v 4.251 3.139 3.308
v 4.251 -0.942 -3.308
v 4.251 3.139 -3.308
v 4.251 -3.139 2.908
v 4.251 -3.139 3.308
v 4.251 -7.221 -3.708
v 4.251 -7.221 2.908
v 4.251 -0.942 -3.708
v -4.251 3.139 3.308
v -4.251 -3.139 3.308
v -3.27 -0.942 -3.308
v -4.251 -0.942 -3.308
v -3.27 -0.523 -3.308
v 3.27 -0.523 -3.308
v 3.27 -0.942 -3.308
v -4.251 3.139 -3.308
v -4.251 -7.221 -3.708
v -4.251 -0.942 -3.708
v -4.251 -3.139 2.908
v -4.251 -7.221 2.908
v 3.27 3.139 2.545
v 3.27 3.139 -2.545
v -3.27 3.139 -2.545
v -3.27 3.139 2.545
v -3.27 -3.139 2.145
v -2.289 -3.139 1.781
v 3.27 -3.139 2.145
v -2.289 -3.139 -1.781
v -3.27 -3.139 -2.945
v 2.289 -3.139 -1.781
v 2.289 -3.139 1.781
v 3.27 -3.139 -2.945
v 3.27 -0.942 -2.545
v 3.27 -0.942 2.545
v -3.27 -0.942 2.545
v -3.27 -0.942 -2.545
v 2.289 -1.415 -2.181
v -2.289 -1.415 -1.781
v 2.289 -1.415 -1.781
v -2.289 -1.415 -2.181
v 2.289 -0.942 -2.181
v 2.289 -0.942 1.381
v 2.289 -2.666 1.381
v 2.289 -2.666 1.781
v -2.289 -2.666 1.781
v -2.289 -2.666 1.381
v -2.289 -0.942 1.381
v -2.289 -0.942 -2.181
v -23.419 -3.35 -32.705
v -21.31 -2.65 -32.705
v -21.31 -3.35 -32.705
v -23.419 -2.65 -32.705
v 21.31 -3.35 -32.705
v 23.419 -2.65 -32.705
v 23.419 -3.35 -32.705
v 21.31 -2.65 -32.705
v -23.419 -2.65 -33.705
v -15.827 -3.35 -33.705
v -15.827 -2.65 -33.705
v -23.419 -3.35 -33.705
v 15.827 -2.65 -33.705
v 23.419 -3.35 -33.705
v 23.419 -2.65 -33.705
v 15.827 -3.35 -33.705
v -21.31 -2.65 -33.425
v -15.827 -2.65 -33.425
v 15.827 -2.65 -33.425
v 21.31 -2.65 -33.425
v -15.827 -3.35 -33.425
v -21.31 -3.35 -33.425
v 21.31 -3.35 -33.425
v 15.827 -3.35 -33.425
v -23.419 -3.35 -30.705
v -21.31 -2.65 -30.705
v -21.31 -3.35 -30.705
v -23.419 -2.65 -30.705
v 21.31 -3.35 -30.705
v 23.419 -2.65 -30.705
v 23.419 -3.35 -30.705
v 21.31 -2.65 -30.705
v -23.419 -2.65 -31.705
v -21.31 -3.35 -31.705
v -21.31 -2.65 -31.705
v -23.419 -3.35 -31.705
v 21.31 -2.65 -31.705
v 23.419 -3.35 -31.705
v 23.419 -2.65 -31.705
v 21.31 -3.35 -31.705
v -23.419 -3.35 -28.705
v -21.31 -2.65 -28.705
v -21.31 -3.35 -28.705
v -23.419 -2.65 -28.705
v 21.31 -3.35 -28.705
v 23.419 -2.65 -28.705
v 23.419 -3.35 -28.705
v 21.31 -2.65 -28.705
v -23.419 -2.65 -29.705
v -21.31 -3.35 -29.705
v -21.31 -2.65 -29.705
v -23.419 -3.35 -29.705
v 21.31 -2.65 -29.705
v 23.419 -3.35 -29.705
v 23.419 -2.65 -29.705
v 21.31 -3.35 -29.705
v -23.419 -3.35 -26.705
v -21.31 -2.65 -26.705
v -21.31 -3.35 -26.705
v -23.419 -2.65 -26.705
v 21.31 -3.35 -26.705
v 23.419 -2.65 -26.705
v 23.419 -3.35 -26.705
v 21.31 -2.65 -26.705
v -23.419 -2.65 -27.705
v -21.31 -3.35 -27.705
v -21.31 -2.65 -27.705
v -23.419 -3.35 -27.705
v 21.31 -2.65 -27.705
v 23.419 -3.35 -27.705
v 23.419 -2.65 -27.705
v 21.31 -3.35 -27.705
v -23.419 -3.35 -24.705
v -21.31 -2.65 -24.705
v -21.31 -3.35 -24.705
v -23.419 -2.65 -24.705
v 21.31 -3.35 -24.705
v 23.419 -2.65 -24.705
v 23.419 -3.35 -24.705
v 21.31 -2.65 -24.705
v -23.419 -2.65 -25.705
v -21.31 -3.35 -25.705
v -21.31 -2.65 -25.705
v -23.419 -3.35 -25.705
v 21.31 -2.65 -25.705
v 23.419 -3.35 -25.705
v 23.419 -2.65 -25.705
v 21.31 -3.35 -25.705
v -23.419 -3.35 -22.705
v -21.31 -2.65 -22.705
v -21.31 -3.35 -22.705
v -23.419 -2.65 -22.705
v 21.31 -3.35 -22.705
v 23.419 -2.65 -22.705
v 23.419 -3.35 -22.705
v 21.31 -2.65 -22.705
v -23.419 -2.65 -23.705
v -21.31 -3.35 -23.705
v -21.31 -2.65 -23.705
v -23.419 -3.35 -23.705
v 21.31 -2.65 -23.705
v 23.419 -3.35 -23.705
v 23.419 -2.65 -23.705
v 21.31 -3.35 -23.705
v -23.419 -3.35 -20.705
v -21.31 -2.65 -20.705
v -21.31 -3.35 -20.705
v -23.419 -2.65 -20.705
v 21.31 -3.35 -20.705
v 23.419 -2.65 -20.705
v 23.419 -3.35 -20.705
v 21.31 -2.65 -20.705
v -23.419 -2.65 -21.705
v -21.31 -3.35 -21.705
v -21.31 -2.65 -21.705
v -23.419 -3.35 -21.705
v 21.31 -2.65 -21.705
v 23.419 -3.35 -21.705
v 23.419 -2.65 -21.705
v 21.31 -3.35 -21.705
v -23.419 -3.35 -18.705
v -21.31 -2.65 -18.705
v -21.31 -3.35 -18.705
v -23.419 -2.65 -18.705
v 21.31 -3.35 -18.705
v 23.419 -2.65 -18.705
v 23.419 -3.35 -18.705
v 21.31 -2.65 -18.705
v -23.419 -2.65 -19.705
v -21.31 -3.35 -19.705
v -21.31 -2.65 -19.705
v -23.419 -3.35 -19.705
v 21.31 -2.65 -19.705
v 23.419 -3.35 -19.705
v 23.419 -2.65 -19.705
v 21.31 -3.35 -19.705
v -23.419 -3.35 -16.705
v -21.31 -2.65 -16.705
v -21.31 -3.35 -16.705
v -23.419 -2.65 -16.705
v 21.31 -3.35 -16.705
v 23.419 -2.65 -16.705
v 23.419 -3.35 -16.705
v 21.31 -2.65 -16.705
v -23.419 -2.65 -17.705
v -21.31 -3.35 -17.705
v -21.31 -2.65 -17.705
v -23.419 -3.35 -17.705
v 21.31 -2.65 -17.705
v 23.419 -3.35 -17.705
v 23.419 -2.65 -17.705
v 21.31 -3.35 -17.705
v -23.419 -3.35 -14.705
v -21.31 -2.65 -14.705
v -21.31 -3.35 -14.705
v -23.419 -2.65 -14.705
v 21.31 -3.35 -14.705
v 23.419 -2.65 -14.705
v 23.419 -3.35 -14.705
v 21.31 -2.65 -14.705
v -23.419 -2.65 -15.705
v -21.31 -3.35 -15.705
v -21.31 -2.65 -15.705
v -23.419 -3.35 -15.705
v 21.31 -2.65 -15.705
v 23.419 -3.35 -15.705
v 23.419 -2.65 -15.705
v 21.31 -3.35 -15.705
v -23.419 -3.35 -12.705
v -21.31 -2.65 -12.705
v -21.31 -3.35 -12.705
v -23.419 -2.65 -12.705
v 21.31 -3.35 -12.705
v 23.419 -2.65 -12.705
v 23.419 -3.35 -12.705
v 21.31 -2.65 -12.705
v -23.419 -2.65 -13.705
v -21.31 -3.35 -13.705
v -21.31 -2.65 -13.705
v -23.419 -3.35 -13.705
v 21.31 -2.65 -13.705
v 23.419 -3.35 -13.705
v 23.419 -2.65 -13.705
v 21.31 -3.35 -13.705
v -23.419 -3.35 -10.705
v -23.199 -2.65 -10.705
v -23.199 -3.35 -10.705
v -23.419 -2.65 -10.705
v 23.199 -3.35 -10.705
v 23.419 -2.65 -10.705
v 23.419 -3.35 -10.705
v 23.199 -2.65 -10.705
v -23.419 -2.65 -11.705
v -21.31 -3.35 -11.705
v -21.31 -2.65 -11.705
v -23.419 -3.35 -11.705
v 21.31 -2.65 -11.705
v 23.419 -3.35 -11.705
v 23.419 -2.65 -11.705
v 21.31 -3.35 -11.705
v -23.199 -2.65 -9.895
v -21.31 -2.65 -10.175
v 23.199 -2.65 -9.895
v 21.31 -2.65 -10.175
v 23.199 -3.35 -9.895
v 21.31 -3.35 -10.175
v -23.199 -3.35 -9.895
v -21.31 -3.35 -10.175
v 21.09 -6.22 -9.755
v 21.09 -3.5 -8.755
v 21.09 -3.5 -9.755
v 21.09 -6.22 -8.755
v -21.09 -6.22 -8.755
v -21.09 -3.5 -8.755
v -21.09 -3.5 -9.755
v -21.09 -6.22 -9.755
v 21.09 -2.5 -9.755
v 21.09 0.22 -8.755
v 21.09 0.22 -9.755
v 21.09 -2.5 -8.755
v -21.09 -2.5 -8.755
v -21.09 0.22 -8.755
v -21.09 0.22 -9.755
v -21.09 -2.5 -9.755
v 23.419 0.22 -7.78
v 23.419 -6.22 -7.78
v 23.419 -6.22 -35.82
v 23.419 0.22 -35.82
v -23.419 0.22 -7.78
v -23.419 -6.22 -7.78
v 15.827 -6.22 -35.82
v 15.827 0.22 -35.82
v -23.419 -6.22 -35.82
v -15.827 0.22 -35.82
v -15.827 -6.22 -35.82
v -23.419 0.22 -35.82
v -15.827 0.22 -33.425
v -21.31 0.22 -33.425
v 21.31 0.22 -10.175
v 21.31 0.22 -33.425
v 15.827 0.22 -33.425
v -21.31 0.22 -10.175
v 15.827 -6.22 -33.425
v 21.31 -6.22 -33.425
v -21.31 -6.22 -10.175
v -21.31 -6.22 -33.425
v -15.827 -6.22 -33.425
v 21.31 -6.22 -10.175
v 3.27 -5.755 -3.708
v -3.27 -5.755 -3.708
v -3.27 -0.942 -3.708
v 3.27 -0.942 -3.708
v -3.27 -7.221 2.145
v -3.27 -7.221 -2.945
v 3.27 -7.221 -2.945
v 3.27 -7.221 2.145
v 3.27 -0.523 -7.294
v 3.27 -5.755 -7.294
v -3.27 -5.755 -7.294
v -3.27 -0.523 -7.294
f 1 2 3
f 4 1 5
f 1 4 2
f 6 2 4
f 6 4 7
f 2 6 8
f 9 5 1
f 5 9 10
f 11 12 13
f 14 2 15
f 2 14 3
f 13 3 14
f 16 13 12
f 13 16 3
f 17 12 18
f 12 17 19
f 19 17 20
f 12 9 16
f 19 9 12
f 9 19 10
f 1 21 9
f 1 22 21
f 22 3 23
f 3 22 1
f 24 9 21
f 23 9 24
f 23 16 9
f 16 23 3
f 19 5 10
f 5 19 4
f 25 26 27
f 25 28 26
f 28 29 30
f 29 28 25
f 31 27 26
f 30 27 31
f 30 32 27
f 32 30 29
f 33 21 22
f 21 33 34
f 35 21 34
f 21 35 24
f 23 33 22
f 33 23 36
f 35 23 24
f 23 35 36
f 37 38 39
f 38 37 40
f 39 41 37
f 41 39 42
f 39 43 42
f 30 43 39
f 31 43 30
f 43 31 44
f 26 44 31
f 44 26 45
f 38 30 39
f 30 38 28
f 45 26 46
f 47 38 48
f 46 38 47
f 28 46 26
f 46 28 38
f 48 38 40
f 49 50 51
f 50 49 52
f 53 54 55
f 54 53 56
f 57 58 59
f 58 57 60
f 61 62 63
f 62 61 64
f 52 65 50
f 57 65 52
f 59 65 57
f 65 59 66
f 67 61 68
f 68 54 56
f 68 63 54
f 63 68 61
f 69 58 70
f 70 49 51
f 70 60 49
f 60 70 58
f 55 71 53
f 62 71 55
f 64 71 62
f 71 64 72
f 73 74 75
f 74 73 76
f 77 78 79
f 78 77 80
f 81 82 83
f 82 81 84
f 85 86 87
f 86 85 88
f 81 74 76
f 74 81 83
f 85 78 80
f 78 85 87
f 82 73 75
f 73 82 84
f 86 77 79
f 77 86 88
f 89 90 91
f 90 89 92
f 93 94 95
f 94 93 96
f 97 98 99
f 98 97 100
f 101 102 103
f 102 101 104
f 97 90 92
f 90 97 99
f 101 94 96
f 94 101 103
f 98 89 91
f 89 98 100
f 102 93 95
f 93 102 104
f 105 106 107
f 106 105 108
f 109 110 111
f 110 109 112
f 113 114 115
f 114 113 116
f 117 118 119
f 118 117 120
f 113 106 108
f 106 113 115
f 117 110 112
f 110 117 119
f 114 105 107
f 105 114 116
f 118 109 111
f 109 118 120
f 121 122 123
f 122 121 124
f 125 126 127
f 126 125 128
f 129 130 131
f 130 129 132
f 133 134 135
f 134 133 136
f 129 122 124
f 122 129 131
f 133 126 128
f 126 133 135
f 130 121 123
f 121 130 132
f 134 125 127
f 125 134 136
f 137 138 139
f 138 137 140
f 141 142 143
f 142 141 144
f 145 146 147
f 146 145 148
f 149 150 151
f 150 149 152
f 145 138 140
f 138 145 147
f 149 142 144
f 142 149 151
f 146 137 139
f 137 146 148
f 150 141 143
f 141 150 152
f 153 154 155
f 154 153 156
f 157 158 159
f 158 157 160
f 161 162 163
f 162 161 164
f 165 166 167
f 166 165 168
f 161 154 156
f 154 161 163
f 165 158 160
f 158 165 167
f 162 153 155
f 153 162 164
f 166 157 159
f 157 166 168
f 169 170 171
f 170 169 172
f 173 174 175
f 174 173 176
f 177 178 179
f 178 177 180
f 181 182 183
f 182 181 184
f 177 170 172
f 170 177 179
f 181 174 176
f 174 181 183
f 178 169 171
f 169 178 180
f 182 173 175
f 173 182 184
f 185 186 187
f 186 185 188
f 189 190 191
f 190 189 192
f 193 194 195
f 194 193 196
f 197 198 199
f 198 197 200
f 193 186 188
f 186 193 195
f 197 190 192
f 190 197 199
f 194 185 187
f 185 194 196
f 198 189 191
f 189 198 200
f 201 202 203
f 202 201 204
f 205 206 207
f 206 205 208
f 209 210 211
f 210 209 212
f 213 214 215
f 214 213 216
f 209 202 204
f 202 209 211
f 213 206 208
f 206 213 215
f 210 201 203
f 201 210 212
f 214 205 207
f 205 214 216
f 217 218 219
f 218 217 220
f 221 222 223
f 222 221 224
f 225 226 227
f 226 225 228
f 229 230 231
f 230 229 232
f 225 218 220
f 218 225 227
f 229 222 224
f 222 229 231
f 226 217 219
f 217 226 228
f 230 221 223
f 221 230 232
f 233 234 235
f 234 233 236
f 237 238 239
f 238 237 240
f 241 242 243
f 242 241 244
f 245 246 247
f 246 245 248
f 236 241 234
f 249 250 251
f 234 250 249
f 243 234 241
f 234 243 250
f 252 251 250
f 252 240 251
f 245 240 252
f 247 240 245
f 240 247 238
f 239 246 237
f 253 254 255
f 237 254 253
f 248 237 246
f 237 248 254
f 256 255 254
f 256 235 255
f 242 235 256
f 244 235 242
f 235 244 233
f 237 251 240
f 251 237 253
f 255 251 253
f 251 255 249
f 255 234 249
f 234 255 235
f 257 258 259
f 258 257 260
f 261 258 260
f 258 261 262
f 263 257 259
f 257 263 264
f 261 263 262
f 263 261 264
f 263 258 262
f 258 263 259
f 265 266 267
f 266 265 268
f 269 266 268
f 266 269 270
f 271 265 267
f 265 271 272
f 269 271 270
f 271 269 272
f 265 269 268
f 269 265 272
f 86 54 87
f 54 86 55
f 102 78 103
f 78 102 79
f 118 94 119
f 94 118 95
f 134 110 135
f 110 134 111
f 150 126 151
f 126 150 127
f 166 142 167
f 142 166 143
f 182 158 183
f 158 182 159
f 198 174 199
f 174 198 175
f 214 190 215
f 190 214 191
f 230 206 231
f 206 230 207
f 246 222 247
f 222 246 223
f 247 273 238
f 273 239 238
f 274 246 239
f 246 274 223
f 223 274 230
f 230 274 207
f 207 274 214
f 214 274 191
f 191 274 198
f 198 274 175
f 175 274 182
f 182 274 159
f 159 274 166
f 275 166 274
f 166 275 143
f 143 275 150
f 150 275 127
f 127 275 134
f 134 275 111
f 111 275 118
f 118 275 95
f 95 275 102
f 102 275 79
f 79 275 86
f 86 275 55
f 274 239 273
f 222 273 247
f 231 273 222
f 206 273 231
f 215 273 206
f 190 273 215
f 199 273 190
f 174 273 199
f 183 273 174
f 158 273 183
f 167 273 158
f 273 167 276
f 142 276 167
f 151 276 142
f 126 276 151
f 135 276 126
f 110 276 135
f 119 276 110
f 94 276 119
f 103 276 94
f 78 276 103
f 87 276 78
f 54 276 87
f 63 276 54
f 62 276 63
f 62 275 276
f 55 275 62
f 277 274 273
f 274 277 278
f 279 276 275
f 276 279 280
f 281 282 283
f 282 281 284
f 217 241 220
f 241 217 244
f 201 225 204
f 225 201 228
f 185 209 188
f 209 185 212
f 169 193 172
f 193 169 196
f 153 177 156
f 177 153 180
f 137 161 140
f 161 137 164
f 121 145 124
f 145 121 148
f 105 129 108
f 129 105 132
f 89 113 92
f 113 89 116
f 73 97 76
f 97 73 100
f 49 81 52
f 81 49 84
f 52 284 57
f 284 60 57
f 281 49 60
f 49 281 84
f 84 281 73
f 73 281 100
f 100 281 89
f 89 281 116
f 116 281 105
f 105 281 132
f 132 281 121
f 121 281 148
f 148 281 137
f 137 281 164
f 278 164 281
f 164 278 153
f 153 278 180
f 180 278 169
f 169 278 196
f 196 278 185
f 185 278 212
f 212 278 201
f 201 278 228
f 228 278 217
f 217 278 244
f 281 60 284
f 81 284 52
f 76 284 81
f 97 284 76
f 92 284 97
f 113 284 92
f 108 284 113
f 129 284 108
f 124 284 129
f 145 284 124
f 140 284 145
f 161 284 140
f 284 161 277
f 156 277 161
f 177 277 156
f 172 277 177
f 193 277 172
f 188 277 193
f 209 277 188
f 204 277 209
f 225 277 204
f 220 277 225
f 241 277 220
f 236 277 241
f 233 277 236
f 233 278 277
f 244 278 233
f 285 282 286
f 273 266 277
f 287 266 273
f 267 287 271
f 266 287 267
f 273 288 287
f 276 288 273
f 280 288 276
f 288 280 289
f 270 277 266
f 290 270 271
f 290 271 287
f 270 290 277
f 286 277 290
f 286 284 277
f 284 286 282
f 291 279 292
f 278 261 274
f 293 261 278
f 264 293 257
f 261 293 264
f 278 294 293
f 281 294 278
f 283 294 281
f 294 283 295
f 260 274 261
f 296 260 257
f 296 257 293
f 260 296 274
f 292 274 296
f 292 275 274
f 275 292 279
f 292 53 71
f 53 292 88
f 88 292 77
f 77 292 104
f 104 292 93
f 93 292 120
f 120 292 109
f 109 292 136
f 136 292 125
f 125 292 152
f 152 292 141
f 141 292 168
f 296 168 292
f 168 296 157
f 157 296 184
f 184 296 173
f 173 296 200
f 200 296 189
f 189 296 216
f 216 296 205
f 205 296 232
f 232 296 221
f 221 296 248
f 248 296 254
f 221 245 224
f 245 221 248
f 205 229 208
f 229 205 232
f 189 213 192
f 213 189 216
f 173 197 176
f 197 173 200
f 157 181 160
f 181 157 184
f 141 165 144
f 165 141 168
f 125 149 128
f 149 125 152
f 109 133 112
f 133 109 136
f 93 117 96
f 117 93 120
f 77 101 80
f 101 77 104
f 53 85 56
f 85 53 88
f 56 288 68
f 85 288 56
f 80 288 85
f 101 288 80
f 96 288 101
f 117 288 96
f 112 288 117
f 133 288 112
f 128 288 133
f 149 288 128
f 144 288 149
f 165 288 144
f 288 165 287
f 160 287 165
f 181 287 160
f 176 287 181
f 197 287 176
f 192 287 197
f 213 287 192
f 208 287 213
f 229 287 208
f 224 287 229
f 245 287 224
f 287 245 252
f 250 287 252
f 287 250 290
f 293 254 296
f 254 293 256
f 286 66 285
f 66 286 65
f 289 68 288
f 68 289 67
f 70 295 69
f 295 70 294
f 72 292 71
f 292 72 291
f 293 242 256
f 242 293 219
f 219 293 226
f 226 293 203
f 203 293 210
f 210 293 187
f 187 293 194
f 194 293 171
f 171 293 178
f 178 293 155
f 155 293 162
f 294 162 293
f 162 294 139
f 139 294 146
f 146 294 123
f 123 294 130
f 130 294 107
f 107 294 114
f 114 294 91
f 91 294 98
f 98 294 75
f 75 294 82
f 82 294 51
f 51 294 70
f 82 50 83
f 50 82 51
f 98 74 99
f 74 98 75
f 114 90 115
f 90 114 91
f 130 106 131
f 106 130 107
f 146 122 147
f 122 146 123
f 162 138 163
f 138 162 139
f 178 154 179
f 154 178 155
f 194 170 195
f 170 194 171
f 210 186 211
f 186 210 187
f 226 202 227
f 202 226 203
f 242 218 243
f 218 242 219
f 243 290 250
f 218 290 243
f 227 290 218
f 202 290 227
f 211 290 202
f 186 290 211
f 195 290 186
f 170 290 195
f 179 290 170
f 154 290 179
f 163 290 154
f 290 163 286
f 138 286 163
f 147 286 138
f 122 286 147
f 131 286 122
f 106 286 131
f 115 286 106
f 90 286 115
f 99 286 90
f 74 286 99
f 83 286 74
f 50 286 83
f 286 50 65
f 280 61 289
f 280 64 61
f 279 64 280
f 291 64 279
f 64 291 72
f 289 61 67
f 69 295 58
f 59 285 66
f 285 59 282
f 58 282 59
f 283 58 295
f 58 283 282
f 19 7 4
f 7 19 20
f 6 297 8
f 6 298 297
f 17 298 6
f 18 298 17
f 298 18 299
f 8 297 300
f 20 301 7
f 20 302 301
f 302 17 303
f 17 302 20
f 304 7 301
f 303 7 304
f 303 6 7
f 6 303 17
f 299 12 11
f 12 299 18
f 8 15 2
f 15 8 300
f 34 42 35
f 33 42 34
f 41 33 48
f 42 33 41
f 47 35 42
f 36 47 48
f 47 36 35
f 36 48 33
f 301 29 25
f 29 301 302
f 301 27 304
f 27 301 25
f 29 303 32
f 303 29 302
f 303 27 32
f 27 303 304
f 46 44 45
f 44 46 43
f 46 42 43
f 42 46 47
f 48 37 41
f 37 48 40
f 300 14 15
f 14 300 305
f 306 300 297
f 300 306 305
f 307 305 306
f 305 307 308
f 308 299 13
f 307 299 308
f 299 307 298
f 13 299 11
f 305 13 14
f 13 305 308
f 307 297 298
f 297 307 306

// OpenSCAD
// file: MotorModel.scad
include <MakerBotSettings.scad>
printer_error = .03;

motor_width  = 42.18;
motor_depth  = 13.90;
motor_height = 22.81;

casing_scale  = 1.1;
casing_width  = casing_scale * motor_width;
casing_height = casing_scale * casing_scale * motor_height;
casing_depth  = 6;


MotorCase(error=printer_error);
//Motor();

module MotorCase(error=0) {

	difference() {
		cube( [casing_width+error, casing_depth+error, casing_height+error ], center=true );
		Motor(error=error);
		translate( [0,0,-1*casing_height/2] )
		Motor(error=error,size=.74);	
        Cutout();
		
	}



}

module Cutout(error=0) {
	translate( [0,0, motor_height/2] )
		cube([ casing_width,.7, 1], center=true );

		translate( [0,casing_depth/-2, (casing_height/casing_scale)/2] )
		cube([ motor_width,5, 1], center=true );

		translate( [0,casing_depth/2, (casing_height/casing_scale)/2] )
		cube([ motor_width,5, 1], center=true );
		
		// Side decals
      for(i = [motor_height/-2 : 2 : motor_height/2 ])
		translate([0,0,i])
		cube([ casing_width*2+error, .7, 1 ],center=true );
}

module Motor(error=0,size=1) {
    cube( [size*motor_width+error, size*motor_depth+error, size*motor_height+error ], center=true );
}
// file: MakerBotSettings.scad
// Printer settings
extruder_width = 0.4;
global_correction = 0.04 + 1*extruder_width;
// main file
include <MakerBotSettings.scad>
use <MotorModel.scad>;
printer_error = global_correction;

sensor_width  = 6.10 + printer_error; //~6.11
sensor_height = 4.39 + printer_error; //~4.40
sensor_depth  = 4.65 + printer_error;  //~4.66

bracket_width = sensor_width / 4;

encasing_scale = 1.3;
encasing_height = sensor_height * encasing_scale;
encasing_width = sensor_width * encasing_scale;
encasing_depth = sensor_depth * encasing_scale;

rotate( 0, [1,0,0] )
FullEncoder_IR();



module FullEncoder_IR() {
    union() {
        SensorBox(1);
		  translate( [0,-3,-21.8])
		  	MotorCase(error=printer_error);
		  translate( [0,-.5*encasing_height, -.8 * encasing_depth] )
//rotate(90, [1,0,0] )
cube( [sensor_width,sensor_width*.8,4], center = true );

translate([0,-.845*sensor_height, (.9-encasing_scale)]) rotate(180) SensorBox(1);
    }
}
module SensorBox(size=1) {
    difference() {
        Sensor(encasing_scale*size);
        translate( [ 0, 1, 0 ] )
        Sensor();
        translate( [0,-2,0] )
        Sensor(.7*size);
    }
}
module Sensor(s=1) { 
	cube( [s*sensor_width, s*sensor_height, s*sensor_depth ], center = true );
}
